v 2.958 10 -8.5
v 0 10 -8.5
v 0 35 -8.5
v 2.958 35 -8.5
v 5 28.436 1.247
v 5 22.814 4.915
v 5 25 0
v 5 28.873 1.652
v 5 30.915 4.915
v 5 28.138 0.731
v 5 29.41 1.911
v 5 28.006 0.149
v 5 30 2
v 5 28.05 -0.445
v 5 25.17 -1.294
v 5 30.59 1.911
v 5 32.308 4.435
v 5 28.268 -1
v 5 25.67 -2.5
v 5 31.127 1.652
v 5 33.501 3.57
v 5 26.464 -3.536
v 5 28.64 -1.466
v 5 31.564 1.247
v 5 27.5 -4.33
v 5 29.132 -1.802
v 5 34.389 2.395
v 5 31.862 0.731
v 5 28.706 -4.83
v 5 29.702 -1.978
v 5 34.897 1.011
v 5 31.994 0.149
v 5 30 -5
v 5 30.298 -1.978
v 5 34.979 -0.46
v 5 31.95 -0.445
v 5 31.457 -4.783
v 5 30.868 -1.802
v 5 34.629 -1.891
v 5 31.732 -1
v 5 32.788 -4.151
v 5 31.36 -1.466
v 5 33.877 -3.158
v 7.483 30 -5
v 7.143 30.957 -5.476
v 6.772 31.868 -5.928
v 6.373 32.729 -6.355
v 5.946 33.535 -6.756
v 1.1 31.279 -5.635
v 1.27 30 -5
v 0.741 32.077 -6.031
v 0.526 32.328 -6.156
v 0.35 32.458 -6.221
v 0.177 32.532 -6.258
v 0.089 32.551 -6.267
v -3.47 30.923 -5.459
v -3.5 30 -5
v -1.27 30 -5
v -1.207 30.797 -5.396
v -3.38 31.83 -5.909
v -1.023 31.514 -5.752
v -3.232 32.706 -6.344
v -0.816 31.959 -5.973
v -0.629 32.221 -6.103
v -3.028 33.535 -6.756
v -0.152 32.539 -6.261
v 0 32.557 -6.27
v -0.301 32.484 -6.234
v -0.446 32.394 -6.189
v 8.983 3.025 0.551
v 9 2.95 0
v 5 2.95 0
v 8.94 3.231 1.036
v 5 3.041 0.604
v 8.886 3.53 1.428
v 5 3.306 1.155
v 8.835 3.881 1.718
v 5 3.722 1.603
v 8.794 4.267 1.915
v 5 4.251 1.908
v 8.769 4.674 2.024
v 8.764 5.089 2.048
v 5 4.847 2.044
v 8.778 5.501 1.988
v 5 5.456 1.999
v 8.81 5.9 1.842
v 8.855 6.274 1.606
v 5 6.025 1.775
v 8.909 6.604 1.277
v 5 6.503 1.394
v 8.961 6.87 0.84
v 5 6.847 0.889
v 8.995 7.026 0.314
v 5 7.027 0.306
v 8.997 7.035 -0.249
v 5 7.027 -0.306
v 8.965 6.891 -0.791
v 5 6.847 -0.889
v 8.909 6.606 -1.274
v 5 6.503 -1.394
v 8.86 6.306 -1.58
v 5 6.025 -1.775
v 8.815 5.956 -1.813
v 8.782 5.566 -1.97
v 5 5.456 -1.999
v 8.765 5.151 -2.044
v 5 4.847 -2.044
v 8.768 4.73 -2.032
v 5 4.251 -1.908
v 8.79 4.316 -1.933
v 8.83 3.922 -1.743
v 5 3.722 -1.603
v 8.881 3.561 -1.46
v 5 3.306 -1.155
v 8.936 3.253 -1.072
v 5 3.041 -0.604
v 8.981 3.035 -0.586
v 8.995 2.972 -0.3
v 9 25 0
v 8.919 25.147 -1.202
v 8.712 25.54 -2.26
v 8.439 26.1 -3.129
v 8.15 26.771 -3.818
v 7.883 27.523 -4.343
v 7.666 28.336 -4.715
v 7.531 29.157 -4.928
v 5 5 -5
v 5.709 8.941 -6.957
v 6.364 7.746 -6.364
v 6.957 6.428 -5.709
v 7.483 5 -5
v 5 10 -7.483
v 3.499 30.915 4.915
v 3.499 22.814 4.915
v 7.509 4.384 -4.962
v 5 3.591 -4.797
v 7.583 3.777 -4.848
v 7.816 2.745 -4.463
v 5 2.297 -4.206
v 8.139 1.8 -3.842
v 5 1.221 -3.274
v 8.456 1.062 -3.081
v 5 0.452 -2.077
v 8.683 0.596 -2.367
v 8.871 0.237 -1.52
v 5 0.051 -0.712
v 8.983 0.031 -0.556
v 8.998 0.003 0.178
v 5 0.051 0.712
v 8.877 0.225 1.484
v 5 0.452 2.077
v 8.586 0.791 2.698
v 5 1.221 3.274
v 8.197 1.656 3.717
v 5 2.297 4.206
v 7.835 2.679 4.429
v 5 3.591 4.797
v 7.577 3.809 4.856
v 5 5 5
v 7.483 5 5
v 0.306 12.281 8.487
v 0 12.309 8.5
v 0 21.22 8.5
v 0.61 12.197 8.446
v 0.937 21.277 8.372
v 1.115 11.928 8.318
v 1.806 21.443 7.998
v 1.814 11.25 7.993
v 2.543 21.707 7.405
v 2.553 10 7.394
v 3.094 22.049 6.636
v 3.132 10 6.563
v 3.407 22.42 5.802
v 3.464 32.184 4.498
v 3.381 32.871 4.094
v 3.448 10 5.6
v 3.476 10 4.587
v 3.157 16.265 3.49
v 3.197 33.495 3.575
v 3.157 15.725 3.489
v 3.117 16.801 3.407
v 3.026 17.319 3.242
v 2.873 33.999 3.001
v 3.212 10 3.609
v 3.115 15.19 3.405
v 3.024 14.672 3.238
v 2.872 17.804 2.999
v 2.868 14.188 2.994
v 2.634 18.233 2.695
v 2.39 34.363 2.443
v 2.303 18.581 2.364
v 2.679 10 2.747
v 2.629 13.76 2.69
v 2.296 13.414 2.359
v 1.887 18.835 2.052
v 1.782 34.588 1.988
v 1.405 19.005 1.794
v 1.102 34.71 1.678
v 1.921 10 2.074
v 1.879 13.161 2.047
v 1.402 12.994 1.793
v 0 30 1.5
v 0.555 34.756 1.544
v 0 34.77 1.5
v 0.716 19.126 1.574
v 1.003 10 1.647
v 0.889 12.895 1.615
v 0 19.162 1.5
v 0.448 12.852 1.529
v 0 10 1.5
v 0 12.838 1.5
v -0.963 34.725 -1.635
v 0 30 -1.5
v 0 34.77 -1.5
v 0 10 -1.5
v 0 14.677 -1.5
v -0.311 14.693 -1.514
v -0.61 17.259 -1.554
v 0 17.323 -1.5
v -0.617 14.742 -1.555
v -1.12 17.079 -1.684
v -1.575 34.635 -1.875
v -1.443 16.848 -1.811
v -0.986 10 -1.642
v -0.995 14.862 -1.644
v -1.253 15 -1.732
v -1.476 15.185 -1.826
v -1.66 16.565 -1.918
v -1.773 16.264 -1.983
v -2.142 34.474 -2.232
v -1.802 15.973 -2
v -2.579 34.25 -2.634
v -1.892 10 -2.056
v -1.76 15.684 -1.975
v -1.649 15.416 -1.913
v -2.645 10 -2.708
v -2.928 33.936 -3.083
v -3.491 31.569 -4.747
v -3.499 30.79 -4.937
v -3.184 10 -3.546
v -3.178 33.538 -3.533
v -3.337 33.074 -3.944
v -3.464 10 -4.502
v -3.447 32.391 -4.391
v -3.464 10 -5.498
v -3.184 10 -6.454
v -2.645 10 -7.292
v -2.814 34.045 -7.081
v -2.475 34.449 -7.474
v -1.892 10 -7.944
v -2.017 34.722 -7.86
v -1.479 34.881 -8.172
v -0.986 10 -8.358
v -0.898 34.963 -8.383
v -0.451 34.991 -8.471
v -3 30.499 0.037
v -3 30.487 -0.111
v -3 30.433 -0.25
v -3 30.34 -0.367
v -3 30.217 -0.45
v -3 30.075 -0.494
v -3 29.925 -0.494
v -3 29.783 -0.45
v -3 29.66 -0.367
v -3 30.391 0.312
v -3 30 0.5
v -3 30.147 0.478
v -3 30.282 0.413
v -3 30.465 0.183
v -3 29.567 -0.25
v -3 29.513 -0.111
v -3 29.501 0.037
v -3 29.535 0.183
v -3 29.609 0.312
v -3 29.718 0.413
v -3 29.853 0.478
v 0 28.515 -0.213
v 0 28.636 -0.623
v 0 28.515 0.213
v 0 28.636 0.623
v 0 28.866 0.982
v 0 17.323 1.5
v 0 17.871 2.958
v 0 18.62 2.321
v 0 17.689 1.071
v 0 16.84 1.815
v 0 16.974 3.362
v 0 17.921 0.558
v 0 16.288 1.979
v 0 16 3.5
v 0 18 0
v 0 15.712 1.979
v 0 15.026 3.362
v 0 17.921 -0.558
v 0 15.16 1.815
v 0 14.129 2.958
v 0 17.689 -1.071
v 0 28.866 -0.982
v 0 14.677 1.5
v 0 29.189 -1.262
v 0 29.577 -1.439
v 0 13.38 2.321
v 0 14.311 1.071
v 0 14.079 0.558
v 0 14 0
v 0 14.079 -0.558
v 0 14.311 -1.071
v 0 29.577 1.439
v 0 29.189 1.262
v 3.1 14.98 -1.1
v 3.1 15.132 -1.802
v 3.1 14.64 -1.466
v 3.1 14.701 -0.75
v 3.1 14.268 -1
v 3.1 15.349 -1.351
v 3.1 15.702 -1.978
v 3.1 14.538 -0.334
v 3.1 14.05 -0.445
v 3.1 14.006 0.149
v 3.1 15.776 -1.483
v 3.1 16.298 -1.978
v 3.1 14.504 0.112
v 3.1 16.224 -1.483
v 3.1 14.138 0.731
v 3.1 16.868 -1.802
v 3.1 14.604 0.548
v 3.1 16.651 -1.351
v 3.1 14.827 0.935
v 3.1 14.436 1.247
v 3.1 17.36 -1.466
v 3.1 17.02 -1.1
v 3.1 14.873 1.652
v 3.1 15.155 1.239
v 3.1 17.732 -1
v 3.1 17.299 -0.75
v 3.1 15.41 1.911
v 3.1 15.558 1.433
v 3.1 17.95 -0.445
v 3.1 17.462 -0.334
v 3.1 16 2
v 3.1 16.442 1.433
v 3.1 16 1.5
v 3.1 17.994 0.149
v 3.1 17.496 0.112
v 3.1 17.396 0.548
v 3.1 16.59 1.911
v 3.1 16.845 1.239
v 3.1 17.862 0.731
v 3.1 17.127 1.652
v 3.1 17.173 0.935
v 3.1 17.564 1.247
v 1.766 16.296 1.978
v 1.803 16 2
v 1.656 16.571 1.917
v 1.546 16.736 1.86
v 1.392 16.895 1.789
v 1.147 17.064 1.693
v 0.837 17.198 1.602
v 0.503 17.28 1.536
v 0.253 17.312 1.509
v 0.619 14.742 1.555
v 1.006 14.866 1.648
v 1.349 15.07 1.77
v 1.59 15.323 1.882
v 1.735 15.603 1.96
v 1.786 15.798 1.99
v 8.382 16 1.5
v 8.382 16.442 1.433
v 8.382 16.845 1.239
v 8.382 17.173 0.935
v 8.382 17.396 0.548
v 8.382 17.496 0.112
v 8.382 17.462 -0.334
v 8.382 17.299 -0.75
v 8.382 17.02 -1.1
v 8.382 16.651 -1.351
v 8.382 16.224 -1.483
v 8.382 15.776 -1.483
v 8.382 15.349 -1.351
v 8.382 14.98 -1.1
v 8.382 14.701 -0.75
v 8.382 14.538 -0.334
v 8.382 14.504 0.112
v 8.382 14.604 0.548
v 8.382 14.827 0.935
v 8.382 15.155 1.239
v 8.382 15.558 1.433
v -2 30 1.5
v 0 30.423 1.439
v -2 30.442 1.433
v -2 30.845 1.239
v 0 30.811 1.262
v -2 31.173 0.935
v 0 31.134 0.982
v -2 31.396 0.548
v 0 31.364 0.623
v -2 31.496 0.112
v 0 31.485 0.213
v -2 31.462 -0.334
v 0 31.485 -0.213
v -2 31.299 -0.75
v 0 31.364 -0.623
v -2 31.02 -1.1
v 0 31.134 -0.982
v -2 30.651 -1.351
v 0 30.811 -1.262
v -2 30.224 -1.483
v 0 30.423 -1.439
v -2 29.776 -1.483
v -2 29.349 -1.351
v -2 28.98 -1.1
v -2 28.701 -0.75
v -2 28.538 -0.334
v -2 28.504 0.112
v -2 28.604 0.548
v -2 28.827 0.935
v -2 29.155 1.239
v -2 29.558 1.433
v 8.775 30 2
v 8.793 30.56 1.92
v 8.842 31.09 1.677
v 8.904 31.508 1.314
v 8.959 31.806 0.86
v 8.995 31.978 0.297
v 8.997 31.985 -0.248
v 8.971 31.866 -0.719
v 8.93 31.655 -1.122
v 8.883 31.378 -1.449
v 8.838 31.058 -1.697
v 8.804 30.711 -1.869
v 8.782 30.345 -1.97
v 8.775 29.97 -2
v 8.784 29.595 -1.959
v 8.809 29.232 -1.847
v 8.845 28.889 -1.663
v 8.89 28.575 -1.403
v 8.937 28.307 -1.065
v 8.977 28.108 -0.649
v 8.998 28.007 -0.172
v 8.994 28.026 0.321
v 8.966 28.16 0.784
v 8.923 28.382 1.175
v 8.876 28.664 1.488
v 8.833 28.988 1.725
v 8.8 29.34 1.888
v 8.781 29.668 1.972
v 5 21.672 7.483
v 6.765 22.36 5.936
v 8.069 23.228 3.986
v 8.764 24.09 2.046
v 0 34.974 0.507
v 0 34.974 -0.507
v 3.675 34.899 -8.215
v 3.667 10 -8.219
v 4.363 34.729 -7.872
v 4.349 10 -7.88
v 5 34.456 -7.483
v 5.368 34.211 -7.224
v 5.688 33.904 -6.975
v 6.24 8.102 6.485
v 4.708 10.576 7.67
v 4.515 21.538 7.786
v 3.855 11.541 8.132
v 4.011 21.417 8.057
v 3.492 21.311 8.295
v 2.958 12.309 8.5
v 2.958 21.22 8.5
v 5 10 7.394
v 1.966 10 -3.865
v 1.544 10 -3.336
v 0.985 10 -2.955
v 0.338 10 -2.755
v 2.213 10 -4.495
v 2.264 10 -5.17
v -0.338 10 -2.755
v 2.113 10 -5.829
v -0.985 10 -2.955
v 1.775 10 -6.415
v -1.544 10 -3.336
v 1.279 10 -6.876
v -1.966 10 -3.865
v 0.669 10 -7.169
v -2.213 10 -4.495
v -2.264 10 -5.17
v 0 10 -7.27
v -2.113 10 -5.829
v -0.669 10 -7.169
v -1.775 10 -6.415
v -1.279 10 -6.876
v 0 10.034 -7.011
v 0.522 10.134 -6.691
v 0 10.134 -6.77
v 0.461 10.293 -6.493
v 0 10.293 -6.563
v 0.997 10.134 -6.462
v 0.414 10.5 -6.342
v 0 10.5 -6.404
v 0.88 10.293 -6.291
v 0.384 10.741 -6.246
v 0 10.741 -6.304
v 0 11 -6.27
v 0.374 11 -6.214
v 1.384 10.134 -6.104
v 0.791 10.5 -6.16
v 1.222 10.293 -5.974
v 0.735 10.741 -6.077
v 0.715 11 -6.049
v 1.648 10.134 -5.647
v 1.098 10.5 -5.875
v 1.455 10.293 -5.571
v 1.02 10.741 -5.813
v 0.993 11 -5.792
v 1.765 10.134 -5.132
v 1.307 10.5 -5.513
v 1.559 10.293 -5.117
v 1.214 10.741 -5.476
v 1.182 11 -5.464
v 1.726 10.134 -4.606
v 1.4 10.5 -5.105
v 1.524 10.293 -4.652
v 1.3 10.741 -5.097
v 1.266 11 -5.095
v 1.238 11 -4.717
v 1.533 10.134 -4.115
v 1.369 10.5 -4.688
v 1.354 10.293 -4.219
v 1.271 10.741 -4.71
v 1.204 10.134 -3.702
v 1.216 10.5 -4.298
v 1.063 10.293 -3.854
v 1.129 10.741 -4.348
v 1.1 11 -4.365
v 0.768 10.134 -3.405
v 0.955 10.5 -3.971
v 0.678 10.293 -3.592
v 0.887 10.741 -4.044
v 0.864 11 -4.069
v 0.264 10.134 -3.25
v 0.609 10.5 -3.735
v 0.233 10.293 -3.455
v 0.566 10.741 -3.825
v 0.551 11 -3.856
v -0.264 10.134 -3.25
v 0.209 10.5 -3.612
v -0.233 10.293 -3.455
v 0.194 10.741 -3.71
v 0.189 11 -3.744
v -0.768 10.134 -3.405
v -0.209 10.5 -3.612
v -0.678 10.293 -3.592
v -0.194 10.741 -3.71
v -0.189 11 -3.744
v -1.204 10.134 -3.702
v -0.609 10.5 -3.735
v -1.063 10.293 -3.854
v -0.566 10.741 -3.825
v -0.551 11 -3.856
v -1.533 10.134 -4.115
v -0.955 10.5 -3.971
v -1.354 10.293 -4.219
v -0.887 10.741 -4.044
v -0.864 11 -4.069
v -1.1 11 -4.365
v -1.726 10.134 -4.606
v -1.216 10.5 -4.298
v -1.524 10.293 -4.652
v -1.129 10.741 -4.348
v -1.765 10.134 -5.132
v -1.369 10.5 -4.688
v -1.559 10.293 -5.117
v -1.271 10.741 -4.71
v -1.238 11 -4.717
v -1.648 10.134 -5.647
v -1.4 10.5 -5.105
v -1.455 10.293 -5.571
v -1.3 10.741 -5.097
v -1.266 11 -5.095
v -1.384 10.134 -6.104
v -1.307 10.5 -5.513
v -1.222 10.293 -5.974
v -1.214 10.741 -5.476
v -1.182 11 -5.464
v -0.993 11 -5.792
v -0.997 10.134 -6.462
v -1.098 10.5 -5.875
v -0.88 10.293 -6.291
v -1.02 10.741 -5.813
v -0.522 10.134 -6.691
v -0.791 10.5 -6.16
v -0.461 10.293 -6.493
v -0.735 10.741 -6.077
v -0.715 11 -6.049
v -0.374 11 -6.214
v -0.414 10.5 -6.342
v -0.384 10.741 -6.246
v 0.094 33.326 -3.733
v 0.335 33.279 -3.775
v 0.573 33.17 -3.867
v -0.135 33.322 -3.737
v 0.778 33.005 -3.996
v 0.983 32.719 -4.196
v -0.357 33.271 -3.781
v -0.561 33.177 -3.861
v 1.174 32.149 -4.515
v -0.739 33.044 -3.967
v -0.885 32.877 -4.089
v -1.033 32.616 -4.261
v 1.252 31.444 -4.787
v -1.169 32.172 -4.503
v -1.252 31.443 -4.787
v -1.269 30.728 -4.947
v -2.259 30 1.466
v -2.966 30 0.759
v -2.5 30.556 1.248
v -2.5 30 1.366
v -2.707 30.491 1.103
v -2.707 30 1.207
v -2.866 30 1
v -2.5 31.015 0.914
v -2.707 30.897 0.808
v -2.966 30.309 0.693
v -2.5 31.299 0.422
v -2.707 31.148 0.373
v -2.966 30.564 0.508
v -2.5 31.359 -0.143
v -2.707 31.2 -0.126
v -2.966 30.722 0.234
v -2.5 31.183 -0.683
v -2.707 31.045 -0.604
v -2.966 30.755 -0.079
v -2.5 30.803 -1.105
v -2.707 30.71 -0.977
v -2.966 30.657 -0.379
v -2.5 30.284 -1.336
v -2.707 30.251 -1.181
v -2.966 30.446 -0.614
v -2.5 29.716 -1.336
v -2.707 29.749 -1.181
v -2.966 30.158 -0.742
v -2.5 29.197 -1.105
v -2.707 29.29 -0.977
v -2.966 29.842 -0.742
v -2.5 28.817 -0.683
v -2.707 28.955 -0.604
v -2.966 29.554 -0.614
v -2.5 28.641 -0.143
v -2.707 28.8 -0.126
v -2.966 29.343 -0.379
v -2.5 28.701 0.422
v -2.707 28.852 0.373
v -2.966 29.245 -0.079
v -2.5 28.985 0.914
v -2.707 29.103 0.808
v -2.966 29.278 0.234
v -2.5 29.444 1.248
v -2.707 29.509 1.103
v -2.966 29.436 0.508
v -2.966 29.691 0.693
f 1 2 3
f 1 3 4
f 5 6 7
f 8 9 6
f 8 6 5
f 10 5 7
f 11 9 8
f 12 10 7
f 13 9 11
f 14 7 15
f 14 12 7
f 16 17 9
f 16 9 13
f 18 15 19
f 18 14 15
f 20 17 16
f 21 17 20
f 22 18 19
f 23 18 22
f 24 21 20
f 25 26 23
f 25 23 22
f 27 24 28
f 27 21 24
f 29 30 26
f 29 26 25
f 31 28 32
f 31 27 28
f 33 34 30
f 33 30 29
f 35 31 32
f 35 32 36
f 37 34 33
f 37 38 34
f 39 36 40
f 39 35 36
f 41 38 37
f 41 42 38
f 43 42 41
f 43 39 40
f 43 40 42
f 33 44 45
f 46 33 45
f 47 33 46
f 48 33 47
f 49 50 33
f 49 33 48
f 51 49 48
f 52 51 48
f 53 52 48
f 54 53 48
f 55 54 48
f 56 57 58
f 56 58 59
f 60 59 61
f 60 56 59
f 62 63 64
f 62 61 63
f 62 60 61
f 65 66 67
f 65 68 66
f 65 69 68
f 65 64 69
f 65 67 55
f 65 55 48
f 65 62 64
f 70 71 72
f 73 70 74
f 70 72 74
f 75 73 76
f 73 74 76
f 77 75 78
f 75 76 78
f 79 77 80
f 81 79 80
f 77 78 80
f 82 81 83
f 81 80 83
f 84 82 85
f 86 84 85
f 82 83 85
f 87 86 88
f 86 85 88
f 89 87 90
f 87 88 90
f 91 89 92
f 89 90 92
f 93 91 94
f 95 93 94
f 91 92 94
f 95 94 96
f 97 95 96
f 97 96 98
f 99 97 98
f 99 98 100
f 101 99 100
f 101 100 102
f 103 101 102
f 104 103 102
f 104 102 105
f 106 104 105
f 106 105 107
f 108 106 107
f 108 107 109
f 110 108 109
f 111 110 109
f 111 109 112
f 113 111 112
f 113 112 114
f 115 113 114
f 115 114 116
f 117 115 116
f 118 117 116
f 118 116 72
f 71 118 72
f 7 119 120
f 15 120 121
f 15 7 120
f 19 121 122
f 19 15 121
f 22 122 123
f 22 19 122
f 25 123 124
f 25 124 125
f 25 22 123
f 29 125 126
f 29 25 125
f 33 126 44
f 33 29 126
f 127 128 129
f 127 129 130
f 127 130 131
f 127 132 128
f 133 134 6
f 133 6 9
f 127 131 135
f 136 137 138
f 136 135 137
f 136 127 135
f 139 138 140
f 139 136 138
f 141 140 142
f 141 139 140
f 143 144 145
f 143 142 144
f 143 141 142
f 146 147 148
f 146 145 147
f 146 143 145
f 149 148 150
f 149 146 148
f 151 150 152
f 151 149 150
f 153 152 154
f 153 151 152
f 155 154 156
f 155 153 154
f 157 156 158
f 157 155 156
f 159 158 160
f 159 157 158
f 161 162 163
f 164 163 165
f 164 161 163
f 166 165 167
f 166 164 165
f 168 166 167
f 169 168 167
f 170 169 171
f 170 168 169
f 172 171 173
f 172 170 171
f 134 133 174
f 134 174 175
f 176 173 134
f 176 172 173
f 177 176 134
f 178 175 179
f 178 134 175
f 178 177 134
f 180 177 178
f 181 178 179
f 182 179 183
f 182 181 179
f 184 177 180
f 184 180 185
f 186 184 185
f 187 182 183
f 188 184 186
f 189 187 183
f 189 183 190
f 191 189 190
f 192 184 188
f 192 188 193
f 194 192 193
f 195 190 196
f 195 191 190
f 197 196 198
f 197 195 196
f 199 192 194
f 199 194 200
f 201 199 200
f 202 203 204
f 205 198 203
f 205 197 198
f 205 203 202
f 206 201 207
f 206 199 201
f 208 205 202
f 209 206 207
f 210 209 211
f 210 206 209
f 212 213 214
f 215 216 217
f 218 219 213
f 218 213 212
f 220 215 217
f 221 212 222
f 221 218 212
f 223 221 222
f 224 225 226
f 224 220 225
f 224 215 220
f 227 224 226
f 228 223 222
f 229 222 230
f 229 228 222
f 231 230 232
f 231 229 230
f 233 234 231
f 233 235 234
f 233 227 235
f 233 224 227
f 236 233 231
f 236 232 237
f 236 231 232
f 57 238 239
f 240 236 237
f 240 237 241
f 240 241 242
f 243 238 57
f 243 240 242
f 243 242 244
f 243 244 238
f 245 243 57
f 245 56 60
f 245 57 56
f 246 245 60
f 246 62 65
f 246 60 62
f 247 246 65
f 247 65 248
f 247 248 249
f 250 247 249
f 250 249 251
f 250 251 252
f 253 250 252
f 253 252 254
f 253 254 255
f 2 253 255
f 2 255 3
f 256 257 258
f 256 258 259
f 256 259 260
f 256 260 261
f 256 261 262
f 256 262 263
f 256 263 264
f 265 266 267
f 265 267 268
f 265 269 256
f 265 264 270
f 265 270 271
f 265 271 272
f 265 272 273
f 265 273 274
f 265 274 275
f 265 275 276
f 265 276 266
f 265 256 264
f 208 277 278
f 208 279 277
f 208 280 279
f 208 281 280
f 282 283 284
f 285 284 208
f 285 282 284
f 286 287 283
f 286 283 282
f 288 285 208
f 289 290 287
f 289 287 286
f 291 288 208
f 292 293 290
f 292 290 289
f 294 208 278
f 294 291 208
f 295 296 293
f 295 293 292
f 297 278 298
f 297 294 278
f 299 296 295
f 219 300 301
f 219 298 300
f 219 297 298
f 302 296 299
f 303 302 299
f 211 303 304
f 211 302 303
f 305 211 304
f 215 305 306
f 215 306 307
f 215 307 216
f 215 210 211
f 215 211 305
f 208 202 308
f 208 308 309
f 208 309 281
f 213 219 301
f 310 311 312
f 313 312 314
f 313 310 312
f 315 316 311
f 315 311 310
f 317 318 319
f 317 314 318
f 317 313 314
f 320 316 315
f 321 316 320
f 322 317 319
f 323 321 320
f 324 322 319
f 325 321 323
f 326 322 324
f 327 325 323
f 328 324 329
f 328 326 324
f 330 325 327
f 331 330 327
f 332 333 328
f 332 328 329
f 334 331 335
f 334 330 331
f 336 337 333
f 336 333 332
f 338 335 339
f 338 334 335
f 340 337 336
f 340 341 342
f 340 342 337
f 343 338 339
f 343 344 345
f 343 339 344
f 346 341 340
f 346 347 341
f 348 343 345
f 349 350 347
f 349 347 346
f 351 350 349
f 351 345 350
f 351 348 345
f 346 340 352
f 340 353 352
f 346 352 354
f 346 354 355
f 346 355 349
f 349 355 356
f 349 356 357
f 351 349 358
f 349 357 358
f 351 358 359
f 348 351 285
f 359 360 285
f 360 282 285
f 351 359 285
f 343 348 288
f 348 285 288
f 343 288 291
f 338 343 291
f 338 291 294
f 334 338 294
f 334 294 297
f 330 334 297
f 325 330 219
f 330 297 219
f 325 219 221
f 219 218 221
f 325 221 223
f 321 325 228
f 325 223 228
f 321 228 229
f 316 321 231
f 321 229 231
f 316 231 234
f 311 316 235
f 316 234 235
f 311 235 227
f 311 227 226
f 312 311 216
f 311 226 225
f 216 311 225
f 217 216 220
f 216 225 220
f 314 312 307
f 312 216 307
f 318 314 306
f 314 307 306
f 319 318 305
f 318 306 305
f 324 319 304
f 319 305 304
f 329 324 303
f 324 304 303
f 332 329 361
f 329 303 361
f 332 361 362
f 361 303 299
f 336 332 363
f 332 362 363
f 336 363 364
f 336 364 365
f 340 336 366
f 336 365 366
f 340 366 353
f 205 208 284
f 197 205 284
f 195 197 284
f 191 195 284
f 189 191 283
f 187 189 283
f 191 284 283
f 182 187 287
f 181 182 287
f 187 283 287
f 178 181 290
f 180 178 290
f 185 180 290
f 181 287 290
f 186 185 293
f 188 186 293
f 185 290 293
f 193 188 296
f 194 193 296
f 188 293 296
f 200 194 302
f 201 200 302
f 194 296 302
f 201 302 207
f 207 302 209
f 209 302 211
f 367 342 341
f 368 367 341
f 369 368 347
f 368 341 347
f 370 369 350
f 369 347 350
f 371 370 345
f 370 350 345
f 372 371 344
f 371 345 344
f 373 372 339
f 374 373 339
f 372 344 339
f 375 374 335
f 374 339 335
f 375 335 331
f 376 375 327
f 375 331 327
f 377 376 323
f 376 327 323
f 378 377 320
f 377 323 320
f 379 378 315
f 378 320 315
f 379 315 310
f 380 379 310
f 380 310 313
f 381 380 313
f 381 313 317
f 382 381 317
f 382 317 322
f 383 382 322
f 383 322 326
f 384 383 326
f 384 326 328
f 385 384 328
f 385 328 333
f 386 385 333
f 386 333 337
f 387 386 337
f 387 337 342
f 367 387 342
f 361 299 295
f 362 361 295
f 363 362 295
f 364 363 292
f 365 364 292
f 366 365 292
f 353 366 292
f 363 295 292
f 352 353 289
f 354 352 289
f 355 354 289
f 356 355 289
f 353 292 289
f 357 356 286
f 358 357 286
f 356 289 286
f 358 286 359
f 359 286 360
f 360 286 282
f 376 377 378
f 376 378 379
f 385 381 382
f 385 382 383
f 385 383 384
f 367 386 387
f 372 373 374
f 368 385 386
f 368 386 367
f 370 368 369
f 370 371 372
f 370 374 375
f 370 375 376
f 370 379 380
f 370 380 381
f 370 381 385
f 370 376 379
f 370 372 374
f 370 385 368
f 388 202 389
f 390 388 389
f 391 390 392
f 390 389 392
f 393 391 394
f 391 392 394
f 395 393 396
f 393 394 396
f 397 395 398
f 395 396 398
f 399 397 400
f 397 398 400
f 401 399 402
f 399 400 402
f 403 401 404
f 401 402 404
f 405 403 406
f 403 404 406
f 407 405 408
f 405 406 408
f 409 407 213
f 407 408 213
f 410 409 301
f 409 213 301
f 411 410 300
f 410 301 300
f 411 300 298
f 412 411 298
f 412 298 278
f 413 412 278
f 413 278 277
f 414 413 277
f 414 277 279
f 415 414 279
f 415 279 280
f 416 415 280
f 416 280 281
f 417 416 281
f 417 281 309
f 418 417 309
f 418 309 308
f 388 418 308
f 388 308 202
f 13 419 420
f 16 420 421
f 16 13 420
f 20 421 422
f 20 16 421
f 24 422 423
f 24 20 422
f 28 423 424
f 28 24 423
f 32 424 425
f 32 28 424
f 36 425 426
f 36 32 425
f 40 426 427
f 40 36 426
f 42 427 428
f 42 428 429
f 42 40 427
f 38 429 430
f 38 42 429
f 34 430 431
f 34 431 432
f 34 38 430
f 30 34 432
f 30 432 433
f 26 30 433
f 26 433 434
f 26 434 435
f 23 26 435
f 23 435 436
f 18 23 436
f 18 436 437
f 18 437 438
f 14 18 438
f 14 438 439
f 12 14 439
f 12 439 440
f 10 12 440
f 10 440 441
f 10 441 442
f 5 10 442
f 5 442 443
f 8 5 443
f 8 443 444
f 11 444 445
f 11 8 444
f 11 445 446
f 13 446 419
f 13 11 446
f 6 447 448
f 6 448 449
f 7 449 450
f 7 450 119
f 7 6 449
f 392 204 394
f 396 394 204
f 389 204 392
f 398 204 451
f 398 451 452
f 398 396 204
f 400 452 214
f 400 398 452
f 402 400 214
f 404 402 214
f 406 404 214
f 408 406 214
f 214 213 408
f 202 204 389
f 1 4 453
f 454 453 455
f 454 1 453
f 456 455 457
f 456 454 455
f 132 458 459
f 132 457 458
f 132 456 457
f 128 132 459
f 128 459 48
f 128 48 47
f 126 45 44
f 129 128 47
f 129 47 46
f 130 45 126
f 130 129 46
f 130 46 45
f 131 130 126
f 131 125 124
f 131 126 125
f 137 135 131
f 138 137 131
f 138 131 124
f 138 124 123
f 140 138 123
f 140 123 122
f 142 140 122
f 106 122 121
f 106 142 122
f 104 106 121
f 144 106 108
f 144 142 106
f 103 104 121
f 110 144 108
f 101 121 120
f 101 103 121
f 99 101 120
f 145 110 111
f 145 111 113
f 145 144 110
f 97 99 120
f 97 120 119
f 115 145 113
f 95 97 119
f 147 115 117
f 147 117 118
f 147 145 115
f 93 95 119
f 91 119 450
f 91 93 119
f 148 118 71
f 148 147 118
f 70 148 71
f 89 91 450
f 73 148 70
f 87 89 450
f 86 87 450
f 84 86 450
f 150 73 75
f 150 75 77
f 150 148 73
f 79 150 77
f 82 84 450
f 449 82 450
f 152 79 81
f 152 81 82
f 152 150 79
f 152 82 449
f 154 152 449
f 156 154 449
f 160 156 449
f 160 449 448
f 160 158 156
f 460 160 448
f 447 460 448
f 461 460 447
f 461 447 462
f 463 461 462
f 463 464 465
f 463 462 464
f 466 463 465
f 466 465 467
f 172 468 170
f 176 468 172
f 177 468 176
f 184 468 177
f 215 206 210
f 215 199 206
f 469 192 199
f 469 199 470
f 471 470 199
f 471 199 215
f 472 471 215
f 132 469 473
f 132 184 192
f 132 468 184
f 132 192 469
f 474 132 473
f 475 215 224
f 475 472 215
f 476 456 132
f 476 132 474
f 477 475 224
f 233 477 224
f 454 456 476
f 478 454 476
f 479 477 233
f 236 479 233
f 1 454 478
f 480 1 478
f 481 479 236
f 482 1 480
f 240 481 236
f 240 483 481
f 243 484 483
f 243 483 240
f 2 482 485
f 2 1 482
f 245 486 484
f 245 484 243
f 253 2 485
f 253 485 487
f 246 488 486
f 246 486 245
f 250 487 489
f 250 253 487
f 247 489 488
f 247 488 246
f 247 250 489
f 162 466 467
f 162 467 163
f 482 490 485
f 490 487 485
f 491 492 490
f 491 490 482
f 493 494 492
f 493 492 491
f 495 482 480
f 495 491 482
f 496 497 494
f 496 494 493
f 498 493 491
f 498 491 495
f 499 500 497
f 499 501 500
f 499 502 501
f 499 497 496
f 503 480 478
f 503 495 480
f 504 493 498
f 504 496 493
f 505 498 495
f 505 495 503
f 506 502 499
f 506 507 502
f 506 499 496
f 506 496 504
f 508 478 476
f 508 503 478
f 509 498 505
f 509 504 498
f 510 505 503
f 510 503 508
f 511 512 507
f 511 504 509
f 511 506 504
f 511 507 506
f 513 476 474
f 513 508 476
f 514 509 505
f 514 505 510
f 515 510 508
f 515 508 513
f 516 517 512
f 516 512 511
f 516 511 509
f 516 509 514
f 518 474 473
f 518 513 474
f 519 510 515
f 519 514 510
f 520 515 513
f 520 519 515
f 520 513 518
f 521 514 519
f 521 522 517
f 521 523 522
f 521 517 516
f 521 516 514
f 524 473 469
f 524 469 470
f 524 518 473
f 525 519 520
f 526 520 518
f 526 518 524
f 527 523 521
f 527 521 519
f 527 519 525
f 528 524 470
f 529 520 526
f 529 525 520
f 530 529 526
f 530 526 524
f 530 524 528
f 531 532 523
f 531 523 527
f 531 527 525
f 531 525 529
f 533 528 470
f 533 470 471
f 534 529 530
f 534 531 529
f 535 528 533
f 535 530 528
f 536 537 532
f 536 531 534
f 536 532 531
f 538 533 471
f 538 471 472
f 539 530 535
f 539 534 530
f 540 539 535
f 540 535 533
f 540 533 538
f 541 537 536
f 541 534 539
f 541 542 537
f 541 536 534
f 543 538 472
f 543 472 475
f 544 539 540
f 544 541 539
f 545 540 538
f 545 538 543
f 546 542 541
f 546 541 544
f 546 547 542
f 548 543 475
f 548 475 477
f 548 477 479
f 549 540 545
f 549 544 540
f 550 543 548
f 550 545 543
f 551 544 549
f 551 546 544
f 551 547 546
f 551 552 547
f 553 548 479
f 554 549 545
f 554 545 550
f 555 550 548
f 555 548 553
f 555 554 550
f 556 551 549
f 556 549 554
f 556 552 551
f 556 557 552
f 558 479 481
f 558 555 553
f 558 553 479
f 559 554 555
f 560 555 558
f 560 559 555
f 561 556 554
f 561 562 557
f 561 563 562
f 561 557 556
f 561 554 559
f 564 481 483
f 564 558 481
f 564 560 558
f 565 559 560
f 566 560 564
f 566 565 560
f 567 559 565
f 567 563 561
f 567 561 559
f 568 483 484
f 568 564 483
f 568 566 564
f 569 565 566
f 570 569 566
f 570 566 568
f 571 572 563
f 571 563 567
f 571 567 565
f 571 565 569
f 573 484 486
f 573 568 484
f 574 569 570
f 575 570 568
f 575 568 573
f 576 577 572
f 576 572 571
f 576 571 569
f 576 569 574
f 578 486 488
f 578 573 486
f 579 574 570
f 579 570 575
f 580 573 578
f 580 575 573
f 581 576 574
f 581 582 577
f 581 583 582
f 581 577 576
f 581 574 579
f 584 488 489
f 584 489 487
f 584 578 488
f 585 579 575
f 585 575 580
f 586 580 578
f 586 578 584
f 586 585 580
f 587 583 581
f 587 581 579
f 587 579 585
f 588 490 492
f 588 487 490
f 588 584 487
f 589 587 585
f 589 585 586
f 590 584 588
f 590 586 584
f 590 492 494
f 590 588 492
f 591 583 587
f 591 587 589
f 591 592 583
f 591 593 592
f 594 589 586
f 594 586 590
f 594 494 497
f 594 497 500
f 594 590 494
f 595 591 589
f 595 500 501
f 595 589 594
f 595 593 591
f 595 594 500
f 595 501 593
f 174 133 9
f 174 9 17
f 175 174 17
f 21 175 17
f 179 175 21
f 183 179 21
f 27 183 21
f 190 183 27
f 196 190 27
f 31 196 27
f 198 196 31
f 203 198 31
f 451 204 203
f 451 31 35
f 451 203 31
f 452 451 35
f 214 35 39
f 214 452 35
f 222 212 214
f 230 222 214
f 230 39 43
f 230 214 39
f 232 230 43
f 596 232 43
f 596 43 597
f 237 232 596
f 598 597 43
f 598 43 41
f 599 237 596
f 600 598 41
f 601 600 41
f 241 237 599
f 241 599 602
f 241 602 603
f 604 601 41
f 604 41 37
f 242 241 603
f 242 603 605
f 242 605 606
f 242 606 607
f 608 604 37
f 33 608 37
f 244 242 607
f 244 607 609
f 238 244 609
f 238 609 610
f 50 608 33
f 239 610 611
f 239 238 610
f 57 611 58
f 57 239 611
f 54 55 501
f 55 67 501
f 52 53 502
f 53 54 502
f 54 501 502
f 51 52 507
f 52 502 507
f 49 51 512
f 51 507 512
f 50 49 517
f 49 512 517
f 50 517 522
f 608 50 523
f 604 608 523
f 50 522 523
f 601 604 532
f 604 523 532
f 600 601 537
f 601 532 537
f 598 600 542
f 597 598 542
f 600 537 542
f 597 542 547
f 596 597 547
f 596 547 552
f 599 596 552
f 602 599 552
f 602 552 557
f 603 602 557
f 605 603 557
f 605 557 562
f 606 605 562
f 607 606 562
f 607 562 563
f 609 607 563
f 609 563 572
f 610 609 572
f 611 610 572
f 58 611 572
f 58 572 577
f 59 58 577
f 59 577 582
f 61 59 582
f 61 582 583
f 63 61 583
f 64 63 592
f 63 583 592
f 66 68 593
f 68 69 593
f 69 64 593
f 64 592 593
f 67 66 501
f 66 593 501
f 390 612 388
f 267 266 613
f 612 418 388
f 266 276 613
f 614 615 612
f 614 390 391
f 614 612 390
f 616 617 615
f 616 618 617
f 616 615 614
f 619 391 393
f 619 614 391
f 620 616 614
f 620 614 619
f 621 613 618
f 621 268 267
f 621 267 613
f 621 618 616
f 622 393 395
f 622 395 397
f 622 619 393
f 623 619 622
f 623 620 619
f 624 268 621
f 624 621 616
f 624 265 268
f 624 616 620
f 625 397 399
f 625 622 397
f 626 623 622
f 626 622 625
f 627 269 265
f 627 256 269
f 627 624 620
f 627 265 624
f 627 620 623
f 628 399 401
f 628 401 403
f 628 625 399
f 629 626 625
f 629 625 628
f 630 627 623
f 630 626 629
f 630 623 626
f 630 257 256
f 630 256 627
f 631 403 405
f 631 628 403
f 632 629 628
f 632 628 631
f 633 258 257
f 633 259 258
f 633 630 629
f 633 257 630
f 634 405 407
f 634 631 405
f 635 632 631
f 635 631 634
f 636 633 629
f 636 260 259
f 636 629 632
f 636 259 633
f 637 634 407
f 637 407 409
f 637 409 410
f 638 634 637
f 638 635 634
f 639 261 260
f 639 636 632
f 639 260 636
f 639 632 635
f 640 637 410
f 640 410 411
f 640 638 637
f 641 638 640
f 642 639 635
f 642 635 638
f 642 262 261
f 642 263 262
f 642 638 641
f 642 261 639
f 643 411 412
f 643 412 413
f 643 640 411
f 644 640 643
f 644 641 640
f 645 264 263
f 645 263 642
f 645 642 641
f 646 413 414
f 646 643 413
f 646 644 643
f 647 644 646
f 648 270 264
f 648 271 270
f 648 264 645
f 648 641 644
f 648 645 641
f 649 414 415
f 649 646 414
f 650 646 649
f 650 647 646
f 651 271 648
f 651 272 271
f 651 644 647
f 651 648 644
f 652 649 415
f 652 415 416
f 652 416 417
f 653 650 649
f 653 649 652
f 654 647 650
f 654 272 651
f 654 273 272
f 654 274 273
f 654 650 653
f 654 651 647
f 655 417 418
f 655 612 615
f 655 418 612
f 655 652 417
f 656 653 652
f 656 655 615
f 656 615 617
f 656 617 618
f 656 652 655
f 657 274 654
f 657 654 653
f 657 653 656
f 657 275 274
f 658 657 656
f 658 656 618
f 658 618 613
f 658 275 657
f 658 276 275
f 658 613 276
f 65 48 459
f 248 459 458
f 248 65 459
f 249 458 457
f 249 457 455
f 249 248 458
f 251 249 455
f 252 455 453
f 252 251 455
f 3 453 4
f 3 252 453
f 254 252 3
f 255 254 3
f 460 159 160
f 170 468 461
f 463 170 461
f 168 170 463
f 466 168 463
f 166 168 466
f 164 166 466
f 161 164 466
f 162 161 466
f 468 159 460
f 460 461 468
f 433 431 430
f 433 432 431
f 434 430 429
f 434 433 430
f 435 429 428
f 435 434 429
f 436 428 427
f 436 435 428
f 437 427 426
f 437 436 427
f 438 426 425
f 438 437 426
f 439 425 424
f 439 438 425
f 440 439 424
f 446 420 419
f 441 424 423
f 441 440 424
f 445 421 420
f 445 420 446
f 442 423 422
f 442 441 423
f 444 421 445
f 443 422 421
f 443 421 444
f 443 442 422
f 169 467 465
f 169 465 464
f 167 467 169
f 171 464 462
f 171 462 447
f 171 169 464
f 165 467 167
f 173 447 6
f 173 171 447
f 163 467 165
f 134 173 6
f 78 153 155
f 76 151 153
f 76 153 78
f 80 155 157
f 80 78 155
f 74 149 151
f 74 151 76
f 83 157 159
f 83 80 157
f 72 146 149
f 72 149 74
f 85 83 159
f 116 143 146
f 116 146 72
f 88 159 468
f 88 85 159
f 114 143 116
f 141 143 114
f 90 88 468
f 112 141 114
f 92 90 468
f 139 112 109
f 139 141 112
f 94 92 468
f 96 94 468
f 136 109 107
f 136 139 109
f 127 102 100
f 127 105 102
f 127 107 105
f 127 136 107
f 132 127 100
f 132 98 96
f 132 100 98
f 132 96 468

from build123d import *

# Parameters (mm, degrees)
BOSS_EXTRUDE1_DEPTH = 35
SKETCH2_R           = 1.27
CUT_EXTRUDE1_DEPTH  = 35
CUT_EXTRUDE2_REACH  = 41.937
SKETCH3_W           = 10
SKETCH3_H           = 10
SKETCH4_R           = 2.049999964
CUT_EXTRUDE3_DEPTH  = 17.5
CUT_EXTRUDE5_START  = -7.95804
SKETCH6_R           = 2
CUT_EXTRUDE5_DEPTH  = 9.6
FILLET3_R           = 1
CUT_EXTRUDE6_START  = 8.64596
SKETCH6_3_R         = 2
CUT_EXTRUDE6_DEPTH  = 6.604
CUT_EXTRUDE7_START  = -14.986
CUT_EXTRUDE7_DEPTH  = 14.986
CUT_EXTRUDE8_DEPTH  = 31.496
SKETCH9_R           = 1.5
CUT_EXTRUDE9_DEPTH  = 8.382
SKETCH11_R          = 2
CUT_EXTRUDE10_DEPTH = 3.1
BOSS_EXTRUDE2_DEPTH = 3.862
SKETCH13_R          = 1.5
BOSS_EXTRUDE4_DEPTH = 3
FILLET5_R           = 1


with BuildPart() as part:
    # Sketch1 → Boss-Extrude1 (new body)
    with BuildSketch(Plane(origin=(0, 0, 0), x_dir=(1, 0, 0), z_dir=(0, 1, 0))):
        with BuildLine():
            Line((-2.958039892, 8.5), (2.958039892, 8.5))
            ThreePointArc((2.958039892, 8.5), (9, 0), (2.958039892, -8.5))
            Line((2.958039892, -8.5), (-2.958039892, -8.5))
            ThreePointArc((-2.958039892, -8.5), (-9, 0), (-2.958039892, 8.5))
        make_face()
    extrude(amount=BOSS_EXTRUDE1_DEPTH)

    # Sketch2 → Cut-Extrude1 (cut)
    with BuildSketch(Plane.XZ):
        with Locations(Location((0, -5, 0), (0, 0, 270))):
            Circle(SKETCH2_R)
        with Locations(Location((0, 5, 0), (0, 0, 270))):
            Circle(SKETCH2_R)
    extrude(amount=-CUT_EXTRUDE1_DEPTH, mode=Mode.SUBTRACT)

    # Cut-Extrude2: up to this face of the body (flat: up to its plane)
    cut_extrude2_end = Plane(part.part.faces().sort_by_distance((0, 17.5, 8.5))[0])
    # Sketch3 → Cut-Extrude2 (cut, up to the picked face)
    with BuildSketch(Plane(origin=(0, 0, -8.5), x_dir=(-1, 0, 0), z_dir=(0, 0, -1)), mode=Mode.PRIVATE) as cut_extrude2_sk1:
        with Locations((0, 5)):
            Rectangle(SKETCH3_W, SKETCH3_H)
    cut_extrude2_tool1 = split(extrude(cut_extrude2_sk1.sketch, amount=-CUT_EXTRUDE2_REACH, mode=Mode.PRIVATE), bisect_by=cut_extrude2_end, keep=Keep.BOTH, mode=Mode.PRIVATE)
    add(cut_extrude2_tool1.solids().sort_by(Axis((0, 5, -8.5), (0, 0, 1)))[0], mode=Mode.SUBTRACT)

    # Sketch4 → Cut-Extrude3 (cut, symmetric)
    with BuildSketch(Plane.ZY.offset(-5)):
        with Locations(Location((0, 5, 0), (0, 0, 270))):
            Circle(SKETCH4_R)
        with BuildLine():
            Line((-7.483314774, 10), (-5, 5))
            ThreePointArc((-5, 5), (0, 0), (5, 5))
            Line((5, 5), (8.5, 12.308552788))
            Line((8.5, 12.308552788), (9.857943437, -1.822240199))
            Line((9.857943437, -1.822240199), (-9.857943437, -1.822240199))
            Line((-9.857943437, -1.822240199), (-7.483314774, 10))
        make_face()
    extrude(amount=CUT_EXTRUDE3_DEPTH, both=True, mode=Mode.SUBTRACT)

    # Sketch6 → Cut-Extrude5 (cut)
    with BuildSketch(Plane.ZY.offset(2.958039892).offset(CUT_EXTRUDE5_START)):
        with BuildLine():
            Line((8.5, 21.219917379), (0, 25))
            ThreePointArc((0, 25), (-3.535533906, 26.464466094), (-5, 30))
            Line((-5, 30), (-6.755867779, 33.535330675))
            ThreePointArc((-6.755867779, 33.535330675), (-7.475170692, 34.449576169), (-8.5, 35))
            Line((-8.5, 35), (17.803004008, 42.886049022))
            Line((17.803004008, 42.886049022), (8.5, 21.219917379))
        make_face()
        with Locations((0, 30)):
            Circle(SKETCH6_R, mode=Mode.SUBTRACT)
    extrude(amount=-CUT_EXTRUDE5_DEPTH, mode=Mode.SUBTRACT)

    # Fillet3
    fillet3_edges = [part.edges().sort_by_distance(p)[0] for p in [
        (0, 10, -3.73),
        (0, 10, 6.27),
    ]]
    fillet(fillet3_edges, radius=FILLET3_R)

    # Sketch6<3> → Cut-Extrude6 (cut)
    with BuildSketch(Plane.ZY.offset(2.958039892).offset(CUT_EXTRUDE6_START)):
        with BuildLine():
            Line((8.5, 21.219917379), (0, 25))
            ThreePointArc((0, 25), (-3.535533906, 26.464466094), (-5, 30))
            Line((-5, 30), (-6.755867779, 33.535330675))
            ThreePointArc((-6.755867779, 33.535330675), (-7.475170692, 34.449576169), (-8.5, 35))
            Line((-8.5, 35), (17.803004008, 42.886049022))
            Line((17.803004008, 42.886049022), (8.5, 21.219917379))
        make_face()
        with Locations((0, 30)):
            Circle(SKETCH6_3_R, mode=Mode.SUBTRACT)
    extrude(amount=-CUT_EXTRUDE6_DEPTH, mode=Mode.SUBTRACT)

    # Sketch7 → Cut-Extrude7 (cut)
    with BuildSketch(Plane(origin=(5, 0, 0), x_dir=(0, 0, -1), z_dir=(1, 0, 0)).offset(CUT_EXTRUDE7_START)):
        with BuildLine():
            Line((5, 30), (6.755867779, 33.535330675))
            ThreePointArc((6.755867779, 33.535330675), (7.475170692, 34.449576169), (8.5, 35))
            Line((8.5, 35), (-8.341946035, 47.536710192))
            Line((-8.341946035, 47.536710192), (-13.168237897, 33.528506419))
            Line((-13.168237897, 33.528506419), (-10.04678731, 20.532036929))
            Line((-10.04678731, 20.532036929), (-4.915473018, 22.814012455))
            Line((-4.915473018, 22.814012455), (-4.915473018, 30.915491676))
            ThreePointArc((-4.915473018, 30.915491676), (0.459692783, 34.97882341), (5, 30))
        make_face()
    extrude(amount=CUT_EXTRUDE7_DEPTH, mode=Mode.SUBTRACT)

    # Sketch8 → Cut-Extrude8 (cut, symmetric)
    with BuildSketch(Plane.XZ.offset(-10)):
        with BuildLine():
            Line((0, 1.5), (0, -1.5))
            ThreePointArc((0, -1.5), (-3.5, -5), (0, -8.5))
            Line((0, -8.5), (-4.790142834, -16.013604782))
            Line((-4.790142834, -16.013604782), (-17.855559142, -9.717705198))
            Line((-17.855559142, -9.717705198), (-4.790142834, 15.219000931))
            Line((-4.790142834, 15.219000931), (0, 8.5))
            ThreePointArc((0, 8.5), (3.5, 5), (0, 1.5))
        make_face()
    extrude(amount=CUT_EXTRUDE8_DEPTH, both=True, mode=Mode.SUBTRACT)

    # Sketch9 → Cut-Extrude9 (cut)
    with BuildSketch(Plane.ZY):
        with Locations((0, 16)):
            Circle(SKETCH9_R)
    extrude(amount=-CUT_EXTRUDE9_DEPTH, mode=Mode.SUBTRACT)

    # Sketch11 → Cut-Extrude10 (cut, symmetric)
    with BuildSketch(Plane.ZY):
        with Locations((0, 16)):
            Circle(SKETCH11_R)
    extrude(amount=CUT_EXTRUDE10_DEPTH, both=True, mode=Mode.SUBTRACT)

    # Sketch12 → Boss-Extrude2 (add)
    with BuildSketch(Plane.ZY):
        with BuildLine():
            Line((0, 18), (0, 19.5))
            ThreePointArc((0, 19.5), (3.5, 16), (0, 12.5))
            Line((0, 12.5), (0, 14))
            ThreePointArc((0, 14), (2, 16), (0, 18))
        make_face()
    extrude(amount=-BOSS_EXTRUDE2_DEPTH)

    # Sketch13 → Boss-Extrude4 (add)
    with BuildSketch(Plane.ZY):
        with Locations((0, 30)):
            Circle(SKETCH13_R)
    extrude(amount=BOSS_EXTRUDE4_DEPTH)

    # Fillet5
    fillet5_edges = [part.edges().sort_by_distance(p)[0] for p in [
        (-3, 30, -1.5),
    ]]
    fillet(fillet5_edges, radius=FILLET5_R)


solid = part.part
